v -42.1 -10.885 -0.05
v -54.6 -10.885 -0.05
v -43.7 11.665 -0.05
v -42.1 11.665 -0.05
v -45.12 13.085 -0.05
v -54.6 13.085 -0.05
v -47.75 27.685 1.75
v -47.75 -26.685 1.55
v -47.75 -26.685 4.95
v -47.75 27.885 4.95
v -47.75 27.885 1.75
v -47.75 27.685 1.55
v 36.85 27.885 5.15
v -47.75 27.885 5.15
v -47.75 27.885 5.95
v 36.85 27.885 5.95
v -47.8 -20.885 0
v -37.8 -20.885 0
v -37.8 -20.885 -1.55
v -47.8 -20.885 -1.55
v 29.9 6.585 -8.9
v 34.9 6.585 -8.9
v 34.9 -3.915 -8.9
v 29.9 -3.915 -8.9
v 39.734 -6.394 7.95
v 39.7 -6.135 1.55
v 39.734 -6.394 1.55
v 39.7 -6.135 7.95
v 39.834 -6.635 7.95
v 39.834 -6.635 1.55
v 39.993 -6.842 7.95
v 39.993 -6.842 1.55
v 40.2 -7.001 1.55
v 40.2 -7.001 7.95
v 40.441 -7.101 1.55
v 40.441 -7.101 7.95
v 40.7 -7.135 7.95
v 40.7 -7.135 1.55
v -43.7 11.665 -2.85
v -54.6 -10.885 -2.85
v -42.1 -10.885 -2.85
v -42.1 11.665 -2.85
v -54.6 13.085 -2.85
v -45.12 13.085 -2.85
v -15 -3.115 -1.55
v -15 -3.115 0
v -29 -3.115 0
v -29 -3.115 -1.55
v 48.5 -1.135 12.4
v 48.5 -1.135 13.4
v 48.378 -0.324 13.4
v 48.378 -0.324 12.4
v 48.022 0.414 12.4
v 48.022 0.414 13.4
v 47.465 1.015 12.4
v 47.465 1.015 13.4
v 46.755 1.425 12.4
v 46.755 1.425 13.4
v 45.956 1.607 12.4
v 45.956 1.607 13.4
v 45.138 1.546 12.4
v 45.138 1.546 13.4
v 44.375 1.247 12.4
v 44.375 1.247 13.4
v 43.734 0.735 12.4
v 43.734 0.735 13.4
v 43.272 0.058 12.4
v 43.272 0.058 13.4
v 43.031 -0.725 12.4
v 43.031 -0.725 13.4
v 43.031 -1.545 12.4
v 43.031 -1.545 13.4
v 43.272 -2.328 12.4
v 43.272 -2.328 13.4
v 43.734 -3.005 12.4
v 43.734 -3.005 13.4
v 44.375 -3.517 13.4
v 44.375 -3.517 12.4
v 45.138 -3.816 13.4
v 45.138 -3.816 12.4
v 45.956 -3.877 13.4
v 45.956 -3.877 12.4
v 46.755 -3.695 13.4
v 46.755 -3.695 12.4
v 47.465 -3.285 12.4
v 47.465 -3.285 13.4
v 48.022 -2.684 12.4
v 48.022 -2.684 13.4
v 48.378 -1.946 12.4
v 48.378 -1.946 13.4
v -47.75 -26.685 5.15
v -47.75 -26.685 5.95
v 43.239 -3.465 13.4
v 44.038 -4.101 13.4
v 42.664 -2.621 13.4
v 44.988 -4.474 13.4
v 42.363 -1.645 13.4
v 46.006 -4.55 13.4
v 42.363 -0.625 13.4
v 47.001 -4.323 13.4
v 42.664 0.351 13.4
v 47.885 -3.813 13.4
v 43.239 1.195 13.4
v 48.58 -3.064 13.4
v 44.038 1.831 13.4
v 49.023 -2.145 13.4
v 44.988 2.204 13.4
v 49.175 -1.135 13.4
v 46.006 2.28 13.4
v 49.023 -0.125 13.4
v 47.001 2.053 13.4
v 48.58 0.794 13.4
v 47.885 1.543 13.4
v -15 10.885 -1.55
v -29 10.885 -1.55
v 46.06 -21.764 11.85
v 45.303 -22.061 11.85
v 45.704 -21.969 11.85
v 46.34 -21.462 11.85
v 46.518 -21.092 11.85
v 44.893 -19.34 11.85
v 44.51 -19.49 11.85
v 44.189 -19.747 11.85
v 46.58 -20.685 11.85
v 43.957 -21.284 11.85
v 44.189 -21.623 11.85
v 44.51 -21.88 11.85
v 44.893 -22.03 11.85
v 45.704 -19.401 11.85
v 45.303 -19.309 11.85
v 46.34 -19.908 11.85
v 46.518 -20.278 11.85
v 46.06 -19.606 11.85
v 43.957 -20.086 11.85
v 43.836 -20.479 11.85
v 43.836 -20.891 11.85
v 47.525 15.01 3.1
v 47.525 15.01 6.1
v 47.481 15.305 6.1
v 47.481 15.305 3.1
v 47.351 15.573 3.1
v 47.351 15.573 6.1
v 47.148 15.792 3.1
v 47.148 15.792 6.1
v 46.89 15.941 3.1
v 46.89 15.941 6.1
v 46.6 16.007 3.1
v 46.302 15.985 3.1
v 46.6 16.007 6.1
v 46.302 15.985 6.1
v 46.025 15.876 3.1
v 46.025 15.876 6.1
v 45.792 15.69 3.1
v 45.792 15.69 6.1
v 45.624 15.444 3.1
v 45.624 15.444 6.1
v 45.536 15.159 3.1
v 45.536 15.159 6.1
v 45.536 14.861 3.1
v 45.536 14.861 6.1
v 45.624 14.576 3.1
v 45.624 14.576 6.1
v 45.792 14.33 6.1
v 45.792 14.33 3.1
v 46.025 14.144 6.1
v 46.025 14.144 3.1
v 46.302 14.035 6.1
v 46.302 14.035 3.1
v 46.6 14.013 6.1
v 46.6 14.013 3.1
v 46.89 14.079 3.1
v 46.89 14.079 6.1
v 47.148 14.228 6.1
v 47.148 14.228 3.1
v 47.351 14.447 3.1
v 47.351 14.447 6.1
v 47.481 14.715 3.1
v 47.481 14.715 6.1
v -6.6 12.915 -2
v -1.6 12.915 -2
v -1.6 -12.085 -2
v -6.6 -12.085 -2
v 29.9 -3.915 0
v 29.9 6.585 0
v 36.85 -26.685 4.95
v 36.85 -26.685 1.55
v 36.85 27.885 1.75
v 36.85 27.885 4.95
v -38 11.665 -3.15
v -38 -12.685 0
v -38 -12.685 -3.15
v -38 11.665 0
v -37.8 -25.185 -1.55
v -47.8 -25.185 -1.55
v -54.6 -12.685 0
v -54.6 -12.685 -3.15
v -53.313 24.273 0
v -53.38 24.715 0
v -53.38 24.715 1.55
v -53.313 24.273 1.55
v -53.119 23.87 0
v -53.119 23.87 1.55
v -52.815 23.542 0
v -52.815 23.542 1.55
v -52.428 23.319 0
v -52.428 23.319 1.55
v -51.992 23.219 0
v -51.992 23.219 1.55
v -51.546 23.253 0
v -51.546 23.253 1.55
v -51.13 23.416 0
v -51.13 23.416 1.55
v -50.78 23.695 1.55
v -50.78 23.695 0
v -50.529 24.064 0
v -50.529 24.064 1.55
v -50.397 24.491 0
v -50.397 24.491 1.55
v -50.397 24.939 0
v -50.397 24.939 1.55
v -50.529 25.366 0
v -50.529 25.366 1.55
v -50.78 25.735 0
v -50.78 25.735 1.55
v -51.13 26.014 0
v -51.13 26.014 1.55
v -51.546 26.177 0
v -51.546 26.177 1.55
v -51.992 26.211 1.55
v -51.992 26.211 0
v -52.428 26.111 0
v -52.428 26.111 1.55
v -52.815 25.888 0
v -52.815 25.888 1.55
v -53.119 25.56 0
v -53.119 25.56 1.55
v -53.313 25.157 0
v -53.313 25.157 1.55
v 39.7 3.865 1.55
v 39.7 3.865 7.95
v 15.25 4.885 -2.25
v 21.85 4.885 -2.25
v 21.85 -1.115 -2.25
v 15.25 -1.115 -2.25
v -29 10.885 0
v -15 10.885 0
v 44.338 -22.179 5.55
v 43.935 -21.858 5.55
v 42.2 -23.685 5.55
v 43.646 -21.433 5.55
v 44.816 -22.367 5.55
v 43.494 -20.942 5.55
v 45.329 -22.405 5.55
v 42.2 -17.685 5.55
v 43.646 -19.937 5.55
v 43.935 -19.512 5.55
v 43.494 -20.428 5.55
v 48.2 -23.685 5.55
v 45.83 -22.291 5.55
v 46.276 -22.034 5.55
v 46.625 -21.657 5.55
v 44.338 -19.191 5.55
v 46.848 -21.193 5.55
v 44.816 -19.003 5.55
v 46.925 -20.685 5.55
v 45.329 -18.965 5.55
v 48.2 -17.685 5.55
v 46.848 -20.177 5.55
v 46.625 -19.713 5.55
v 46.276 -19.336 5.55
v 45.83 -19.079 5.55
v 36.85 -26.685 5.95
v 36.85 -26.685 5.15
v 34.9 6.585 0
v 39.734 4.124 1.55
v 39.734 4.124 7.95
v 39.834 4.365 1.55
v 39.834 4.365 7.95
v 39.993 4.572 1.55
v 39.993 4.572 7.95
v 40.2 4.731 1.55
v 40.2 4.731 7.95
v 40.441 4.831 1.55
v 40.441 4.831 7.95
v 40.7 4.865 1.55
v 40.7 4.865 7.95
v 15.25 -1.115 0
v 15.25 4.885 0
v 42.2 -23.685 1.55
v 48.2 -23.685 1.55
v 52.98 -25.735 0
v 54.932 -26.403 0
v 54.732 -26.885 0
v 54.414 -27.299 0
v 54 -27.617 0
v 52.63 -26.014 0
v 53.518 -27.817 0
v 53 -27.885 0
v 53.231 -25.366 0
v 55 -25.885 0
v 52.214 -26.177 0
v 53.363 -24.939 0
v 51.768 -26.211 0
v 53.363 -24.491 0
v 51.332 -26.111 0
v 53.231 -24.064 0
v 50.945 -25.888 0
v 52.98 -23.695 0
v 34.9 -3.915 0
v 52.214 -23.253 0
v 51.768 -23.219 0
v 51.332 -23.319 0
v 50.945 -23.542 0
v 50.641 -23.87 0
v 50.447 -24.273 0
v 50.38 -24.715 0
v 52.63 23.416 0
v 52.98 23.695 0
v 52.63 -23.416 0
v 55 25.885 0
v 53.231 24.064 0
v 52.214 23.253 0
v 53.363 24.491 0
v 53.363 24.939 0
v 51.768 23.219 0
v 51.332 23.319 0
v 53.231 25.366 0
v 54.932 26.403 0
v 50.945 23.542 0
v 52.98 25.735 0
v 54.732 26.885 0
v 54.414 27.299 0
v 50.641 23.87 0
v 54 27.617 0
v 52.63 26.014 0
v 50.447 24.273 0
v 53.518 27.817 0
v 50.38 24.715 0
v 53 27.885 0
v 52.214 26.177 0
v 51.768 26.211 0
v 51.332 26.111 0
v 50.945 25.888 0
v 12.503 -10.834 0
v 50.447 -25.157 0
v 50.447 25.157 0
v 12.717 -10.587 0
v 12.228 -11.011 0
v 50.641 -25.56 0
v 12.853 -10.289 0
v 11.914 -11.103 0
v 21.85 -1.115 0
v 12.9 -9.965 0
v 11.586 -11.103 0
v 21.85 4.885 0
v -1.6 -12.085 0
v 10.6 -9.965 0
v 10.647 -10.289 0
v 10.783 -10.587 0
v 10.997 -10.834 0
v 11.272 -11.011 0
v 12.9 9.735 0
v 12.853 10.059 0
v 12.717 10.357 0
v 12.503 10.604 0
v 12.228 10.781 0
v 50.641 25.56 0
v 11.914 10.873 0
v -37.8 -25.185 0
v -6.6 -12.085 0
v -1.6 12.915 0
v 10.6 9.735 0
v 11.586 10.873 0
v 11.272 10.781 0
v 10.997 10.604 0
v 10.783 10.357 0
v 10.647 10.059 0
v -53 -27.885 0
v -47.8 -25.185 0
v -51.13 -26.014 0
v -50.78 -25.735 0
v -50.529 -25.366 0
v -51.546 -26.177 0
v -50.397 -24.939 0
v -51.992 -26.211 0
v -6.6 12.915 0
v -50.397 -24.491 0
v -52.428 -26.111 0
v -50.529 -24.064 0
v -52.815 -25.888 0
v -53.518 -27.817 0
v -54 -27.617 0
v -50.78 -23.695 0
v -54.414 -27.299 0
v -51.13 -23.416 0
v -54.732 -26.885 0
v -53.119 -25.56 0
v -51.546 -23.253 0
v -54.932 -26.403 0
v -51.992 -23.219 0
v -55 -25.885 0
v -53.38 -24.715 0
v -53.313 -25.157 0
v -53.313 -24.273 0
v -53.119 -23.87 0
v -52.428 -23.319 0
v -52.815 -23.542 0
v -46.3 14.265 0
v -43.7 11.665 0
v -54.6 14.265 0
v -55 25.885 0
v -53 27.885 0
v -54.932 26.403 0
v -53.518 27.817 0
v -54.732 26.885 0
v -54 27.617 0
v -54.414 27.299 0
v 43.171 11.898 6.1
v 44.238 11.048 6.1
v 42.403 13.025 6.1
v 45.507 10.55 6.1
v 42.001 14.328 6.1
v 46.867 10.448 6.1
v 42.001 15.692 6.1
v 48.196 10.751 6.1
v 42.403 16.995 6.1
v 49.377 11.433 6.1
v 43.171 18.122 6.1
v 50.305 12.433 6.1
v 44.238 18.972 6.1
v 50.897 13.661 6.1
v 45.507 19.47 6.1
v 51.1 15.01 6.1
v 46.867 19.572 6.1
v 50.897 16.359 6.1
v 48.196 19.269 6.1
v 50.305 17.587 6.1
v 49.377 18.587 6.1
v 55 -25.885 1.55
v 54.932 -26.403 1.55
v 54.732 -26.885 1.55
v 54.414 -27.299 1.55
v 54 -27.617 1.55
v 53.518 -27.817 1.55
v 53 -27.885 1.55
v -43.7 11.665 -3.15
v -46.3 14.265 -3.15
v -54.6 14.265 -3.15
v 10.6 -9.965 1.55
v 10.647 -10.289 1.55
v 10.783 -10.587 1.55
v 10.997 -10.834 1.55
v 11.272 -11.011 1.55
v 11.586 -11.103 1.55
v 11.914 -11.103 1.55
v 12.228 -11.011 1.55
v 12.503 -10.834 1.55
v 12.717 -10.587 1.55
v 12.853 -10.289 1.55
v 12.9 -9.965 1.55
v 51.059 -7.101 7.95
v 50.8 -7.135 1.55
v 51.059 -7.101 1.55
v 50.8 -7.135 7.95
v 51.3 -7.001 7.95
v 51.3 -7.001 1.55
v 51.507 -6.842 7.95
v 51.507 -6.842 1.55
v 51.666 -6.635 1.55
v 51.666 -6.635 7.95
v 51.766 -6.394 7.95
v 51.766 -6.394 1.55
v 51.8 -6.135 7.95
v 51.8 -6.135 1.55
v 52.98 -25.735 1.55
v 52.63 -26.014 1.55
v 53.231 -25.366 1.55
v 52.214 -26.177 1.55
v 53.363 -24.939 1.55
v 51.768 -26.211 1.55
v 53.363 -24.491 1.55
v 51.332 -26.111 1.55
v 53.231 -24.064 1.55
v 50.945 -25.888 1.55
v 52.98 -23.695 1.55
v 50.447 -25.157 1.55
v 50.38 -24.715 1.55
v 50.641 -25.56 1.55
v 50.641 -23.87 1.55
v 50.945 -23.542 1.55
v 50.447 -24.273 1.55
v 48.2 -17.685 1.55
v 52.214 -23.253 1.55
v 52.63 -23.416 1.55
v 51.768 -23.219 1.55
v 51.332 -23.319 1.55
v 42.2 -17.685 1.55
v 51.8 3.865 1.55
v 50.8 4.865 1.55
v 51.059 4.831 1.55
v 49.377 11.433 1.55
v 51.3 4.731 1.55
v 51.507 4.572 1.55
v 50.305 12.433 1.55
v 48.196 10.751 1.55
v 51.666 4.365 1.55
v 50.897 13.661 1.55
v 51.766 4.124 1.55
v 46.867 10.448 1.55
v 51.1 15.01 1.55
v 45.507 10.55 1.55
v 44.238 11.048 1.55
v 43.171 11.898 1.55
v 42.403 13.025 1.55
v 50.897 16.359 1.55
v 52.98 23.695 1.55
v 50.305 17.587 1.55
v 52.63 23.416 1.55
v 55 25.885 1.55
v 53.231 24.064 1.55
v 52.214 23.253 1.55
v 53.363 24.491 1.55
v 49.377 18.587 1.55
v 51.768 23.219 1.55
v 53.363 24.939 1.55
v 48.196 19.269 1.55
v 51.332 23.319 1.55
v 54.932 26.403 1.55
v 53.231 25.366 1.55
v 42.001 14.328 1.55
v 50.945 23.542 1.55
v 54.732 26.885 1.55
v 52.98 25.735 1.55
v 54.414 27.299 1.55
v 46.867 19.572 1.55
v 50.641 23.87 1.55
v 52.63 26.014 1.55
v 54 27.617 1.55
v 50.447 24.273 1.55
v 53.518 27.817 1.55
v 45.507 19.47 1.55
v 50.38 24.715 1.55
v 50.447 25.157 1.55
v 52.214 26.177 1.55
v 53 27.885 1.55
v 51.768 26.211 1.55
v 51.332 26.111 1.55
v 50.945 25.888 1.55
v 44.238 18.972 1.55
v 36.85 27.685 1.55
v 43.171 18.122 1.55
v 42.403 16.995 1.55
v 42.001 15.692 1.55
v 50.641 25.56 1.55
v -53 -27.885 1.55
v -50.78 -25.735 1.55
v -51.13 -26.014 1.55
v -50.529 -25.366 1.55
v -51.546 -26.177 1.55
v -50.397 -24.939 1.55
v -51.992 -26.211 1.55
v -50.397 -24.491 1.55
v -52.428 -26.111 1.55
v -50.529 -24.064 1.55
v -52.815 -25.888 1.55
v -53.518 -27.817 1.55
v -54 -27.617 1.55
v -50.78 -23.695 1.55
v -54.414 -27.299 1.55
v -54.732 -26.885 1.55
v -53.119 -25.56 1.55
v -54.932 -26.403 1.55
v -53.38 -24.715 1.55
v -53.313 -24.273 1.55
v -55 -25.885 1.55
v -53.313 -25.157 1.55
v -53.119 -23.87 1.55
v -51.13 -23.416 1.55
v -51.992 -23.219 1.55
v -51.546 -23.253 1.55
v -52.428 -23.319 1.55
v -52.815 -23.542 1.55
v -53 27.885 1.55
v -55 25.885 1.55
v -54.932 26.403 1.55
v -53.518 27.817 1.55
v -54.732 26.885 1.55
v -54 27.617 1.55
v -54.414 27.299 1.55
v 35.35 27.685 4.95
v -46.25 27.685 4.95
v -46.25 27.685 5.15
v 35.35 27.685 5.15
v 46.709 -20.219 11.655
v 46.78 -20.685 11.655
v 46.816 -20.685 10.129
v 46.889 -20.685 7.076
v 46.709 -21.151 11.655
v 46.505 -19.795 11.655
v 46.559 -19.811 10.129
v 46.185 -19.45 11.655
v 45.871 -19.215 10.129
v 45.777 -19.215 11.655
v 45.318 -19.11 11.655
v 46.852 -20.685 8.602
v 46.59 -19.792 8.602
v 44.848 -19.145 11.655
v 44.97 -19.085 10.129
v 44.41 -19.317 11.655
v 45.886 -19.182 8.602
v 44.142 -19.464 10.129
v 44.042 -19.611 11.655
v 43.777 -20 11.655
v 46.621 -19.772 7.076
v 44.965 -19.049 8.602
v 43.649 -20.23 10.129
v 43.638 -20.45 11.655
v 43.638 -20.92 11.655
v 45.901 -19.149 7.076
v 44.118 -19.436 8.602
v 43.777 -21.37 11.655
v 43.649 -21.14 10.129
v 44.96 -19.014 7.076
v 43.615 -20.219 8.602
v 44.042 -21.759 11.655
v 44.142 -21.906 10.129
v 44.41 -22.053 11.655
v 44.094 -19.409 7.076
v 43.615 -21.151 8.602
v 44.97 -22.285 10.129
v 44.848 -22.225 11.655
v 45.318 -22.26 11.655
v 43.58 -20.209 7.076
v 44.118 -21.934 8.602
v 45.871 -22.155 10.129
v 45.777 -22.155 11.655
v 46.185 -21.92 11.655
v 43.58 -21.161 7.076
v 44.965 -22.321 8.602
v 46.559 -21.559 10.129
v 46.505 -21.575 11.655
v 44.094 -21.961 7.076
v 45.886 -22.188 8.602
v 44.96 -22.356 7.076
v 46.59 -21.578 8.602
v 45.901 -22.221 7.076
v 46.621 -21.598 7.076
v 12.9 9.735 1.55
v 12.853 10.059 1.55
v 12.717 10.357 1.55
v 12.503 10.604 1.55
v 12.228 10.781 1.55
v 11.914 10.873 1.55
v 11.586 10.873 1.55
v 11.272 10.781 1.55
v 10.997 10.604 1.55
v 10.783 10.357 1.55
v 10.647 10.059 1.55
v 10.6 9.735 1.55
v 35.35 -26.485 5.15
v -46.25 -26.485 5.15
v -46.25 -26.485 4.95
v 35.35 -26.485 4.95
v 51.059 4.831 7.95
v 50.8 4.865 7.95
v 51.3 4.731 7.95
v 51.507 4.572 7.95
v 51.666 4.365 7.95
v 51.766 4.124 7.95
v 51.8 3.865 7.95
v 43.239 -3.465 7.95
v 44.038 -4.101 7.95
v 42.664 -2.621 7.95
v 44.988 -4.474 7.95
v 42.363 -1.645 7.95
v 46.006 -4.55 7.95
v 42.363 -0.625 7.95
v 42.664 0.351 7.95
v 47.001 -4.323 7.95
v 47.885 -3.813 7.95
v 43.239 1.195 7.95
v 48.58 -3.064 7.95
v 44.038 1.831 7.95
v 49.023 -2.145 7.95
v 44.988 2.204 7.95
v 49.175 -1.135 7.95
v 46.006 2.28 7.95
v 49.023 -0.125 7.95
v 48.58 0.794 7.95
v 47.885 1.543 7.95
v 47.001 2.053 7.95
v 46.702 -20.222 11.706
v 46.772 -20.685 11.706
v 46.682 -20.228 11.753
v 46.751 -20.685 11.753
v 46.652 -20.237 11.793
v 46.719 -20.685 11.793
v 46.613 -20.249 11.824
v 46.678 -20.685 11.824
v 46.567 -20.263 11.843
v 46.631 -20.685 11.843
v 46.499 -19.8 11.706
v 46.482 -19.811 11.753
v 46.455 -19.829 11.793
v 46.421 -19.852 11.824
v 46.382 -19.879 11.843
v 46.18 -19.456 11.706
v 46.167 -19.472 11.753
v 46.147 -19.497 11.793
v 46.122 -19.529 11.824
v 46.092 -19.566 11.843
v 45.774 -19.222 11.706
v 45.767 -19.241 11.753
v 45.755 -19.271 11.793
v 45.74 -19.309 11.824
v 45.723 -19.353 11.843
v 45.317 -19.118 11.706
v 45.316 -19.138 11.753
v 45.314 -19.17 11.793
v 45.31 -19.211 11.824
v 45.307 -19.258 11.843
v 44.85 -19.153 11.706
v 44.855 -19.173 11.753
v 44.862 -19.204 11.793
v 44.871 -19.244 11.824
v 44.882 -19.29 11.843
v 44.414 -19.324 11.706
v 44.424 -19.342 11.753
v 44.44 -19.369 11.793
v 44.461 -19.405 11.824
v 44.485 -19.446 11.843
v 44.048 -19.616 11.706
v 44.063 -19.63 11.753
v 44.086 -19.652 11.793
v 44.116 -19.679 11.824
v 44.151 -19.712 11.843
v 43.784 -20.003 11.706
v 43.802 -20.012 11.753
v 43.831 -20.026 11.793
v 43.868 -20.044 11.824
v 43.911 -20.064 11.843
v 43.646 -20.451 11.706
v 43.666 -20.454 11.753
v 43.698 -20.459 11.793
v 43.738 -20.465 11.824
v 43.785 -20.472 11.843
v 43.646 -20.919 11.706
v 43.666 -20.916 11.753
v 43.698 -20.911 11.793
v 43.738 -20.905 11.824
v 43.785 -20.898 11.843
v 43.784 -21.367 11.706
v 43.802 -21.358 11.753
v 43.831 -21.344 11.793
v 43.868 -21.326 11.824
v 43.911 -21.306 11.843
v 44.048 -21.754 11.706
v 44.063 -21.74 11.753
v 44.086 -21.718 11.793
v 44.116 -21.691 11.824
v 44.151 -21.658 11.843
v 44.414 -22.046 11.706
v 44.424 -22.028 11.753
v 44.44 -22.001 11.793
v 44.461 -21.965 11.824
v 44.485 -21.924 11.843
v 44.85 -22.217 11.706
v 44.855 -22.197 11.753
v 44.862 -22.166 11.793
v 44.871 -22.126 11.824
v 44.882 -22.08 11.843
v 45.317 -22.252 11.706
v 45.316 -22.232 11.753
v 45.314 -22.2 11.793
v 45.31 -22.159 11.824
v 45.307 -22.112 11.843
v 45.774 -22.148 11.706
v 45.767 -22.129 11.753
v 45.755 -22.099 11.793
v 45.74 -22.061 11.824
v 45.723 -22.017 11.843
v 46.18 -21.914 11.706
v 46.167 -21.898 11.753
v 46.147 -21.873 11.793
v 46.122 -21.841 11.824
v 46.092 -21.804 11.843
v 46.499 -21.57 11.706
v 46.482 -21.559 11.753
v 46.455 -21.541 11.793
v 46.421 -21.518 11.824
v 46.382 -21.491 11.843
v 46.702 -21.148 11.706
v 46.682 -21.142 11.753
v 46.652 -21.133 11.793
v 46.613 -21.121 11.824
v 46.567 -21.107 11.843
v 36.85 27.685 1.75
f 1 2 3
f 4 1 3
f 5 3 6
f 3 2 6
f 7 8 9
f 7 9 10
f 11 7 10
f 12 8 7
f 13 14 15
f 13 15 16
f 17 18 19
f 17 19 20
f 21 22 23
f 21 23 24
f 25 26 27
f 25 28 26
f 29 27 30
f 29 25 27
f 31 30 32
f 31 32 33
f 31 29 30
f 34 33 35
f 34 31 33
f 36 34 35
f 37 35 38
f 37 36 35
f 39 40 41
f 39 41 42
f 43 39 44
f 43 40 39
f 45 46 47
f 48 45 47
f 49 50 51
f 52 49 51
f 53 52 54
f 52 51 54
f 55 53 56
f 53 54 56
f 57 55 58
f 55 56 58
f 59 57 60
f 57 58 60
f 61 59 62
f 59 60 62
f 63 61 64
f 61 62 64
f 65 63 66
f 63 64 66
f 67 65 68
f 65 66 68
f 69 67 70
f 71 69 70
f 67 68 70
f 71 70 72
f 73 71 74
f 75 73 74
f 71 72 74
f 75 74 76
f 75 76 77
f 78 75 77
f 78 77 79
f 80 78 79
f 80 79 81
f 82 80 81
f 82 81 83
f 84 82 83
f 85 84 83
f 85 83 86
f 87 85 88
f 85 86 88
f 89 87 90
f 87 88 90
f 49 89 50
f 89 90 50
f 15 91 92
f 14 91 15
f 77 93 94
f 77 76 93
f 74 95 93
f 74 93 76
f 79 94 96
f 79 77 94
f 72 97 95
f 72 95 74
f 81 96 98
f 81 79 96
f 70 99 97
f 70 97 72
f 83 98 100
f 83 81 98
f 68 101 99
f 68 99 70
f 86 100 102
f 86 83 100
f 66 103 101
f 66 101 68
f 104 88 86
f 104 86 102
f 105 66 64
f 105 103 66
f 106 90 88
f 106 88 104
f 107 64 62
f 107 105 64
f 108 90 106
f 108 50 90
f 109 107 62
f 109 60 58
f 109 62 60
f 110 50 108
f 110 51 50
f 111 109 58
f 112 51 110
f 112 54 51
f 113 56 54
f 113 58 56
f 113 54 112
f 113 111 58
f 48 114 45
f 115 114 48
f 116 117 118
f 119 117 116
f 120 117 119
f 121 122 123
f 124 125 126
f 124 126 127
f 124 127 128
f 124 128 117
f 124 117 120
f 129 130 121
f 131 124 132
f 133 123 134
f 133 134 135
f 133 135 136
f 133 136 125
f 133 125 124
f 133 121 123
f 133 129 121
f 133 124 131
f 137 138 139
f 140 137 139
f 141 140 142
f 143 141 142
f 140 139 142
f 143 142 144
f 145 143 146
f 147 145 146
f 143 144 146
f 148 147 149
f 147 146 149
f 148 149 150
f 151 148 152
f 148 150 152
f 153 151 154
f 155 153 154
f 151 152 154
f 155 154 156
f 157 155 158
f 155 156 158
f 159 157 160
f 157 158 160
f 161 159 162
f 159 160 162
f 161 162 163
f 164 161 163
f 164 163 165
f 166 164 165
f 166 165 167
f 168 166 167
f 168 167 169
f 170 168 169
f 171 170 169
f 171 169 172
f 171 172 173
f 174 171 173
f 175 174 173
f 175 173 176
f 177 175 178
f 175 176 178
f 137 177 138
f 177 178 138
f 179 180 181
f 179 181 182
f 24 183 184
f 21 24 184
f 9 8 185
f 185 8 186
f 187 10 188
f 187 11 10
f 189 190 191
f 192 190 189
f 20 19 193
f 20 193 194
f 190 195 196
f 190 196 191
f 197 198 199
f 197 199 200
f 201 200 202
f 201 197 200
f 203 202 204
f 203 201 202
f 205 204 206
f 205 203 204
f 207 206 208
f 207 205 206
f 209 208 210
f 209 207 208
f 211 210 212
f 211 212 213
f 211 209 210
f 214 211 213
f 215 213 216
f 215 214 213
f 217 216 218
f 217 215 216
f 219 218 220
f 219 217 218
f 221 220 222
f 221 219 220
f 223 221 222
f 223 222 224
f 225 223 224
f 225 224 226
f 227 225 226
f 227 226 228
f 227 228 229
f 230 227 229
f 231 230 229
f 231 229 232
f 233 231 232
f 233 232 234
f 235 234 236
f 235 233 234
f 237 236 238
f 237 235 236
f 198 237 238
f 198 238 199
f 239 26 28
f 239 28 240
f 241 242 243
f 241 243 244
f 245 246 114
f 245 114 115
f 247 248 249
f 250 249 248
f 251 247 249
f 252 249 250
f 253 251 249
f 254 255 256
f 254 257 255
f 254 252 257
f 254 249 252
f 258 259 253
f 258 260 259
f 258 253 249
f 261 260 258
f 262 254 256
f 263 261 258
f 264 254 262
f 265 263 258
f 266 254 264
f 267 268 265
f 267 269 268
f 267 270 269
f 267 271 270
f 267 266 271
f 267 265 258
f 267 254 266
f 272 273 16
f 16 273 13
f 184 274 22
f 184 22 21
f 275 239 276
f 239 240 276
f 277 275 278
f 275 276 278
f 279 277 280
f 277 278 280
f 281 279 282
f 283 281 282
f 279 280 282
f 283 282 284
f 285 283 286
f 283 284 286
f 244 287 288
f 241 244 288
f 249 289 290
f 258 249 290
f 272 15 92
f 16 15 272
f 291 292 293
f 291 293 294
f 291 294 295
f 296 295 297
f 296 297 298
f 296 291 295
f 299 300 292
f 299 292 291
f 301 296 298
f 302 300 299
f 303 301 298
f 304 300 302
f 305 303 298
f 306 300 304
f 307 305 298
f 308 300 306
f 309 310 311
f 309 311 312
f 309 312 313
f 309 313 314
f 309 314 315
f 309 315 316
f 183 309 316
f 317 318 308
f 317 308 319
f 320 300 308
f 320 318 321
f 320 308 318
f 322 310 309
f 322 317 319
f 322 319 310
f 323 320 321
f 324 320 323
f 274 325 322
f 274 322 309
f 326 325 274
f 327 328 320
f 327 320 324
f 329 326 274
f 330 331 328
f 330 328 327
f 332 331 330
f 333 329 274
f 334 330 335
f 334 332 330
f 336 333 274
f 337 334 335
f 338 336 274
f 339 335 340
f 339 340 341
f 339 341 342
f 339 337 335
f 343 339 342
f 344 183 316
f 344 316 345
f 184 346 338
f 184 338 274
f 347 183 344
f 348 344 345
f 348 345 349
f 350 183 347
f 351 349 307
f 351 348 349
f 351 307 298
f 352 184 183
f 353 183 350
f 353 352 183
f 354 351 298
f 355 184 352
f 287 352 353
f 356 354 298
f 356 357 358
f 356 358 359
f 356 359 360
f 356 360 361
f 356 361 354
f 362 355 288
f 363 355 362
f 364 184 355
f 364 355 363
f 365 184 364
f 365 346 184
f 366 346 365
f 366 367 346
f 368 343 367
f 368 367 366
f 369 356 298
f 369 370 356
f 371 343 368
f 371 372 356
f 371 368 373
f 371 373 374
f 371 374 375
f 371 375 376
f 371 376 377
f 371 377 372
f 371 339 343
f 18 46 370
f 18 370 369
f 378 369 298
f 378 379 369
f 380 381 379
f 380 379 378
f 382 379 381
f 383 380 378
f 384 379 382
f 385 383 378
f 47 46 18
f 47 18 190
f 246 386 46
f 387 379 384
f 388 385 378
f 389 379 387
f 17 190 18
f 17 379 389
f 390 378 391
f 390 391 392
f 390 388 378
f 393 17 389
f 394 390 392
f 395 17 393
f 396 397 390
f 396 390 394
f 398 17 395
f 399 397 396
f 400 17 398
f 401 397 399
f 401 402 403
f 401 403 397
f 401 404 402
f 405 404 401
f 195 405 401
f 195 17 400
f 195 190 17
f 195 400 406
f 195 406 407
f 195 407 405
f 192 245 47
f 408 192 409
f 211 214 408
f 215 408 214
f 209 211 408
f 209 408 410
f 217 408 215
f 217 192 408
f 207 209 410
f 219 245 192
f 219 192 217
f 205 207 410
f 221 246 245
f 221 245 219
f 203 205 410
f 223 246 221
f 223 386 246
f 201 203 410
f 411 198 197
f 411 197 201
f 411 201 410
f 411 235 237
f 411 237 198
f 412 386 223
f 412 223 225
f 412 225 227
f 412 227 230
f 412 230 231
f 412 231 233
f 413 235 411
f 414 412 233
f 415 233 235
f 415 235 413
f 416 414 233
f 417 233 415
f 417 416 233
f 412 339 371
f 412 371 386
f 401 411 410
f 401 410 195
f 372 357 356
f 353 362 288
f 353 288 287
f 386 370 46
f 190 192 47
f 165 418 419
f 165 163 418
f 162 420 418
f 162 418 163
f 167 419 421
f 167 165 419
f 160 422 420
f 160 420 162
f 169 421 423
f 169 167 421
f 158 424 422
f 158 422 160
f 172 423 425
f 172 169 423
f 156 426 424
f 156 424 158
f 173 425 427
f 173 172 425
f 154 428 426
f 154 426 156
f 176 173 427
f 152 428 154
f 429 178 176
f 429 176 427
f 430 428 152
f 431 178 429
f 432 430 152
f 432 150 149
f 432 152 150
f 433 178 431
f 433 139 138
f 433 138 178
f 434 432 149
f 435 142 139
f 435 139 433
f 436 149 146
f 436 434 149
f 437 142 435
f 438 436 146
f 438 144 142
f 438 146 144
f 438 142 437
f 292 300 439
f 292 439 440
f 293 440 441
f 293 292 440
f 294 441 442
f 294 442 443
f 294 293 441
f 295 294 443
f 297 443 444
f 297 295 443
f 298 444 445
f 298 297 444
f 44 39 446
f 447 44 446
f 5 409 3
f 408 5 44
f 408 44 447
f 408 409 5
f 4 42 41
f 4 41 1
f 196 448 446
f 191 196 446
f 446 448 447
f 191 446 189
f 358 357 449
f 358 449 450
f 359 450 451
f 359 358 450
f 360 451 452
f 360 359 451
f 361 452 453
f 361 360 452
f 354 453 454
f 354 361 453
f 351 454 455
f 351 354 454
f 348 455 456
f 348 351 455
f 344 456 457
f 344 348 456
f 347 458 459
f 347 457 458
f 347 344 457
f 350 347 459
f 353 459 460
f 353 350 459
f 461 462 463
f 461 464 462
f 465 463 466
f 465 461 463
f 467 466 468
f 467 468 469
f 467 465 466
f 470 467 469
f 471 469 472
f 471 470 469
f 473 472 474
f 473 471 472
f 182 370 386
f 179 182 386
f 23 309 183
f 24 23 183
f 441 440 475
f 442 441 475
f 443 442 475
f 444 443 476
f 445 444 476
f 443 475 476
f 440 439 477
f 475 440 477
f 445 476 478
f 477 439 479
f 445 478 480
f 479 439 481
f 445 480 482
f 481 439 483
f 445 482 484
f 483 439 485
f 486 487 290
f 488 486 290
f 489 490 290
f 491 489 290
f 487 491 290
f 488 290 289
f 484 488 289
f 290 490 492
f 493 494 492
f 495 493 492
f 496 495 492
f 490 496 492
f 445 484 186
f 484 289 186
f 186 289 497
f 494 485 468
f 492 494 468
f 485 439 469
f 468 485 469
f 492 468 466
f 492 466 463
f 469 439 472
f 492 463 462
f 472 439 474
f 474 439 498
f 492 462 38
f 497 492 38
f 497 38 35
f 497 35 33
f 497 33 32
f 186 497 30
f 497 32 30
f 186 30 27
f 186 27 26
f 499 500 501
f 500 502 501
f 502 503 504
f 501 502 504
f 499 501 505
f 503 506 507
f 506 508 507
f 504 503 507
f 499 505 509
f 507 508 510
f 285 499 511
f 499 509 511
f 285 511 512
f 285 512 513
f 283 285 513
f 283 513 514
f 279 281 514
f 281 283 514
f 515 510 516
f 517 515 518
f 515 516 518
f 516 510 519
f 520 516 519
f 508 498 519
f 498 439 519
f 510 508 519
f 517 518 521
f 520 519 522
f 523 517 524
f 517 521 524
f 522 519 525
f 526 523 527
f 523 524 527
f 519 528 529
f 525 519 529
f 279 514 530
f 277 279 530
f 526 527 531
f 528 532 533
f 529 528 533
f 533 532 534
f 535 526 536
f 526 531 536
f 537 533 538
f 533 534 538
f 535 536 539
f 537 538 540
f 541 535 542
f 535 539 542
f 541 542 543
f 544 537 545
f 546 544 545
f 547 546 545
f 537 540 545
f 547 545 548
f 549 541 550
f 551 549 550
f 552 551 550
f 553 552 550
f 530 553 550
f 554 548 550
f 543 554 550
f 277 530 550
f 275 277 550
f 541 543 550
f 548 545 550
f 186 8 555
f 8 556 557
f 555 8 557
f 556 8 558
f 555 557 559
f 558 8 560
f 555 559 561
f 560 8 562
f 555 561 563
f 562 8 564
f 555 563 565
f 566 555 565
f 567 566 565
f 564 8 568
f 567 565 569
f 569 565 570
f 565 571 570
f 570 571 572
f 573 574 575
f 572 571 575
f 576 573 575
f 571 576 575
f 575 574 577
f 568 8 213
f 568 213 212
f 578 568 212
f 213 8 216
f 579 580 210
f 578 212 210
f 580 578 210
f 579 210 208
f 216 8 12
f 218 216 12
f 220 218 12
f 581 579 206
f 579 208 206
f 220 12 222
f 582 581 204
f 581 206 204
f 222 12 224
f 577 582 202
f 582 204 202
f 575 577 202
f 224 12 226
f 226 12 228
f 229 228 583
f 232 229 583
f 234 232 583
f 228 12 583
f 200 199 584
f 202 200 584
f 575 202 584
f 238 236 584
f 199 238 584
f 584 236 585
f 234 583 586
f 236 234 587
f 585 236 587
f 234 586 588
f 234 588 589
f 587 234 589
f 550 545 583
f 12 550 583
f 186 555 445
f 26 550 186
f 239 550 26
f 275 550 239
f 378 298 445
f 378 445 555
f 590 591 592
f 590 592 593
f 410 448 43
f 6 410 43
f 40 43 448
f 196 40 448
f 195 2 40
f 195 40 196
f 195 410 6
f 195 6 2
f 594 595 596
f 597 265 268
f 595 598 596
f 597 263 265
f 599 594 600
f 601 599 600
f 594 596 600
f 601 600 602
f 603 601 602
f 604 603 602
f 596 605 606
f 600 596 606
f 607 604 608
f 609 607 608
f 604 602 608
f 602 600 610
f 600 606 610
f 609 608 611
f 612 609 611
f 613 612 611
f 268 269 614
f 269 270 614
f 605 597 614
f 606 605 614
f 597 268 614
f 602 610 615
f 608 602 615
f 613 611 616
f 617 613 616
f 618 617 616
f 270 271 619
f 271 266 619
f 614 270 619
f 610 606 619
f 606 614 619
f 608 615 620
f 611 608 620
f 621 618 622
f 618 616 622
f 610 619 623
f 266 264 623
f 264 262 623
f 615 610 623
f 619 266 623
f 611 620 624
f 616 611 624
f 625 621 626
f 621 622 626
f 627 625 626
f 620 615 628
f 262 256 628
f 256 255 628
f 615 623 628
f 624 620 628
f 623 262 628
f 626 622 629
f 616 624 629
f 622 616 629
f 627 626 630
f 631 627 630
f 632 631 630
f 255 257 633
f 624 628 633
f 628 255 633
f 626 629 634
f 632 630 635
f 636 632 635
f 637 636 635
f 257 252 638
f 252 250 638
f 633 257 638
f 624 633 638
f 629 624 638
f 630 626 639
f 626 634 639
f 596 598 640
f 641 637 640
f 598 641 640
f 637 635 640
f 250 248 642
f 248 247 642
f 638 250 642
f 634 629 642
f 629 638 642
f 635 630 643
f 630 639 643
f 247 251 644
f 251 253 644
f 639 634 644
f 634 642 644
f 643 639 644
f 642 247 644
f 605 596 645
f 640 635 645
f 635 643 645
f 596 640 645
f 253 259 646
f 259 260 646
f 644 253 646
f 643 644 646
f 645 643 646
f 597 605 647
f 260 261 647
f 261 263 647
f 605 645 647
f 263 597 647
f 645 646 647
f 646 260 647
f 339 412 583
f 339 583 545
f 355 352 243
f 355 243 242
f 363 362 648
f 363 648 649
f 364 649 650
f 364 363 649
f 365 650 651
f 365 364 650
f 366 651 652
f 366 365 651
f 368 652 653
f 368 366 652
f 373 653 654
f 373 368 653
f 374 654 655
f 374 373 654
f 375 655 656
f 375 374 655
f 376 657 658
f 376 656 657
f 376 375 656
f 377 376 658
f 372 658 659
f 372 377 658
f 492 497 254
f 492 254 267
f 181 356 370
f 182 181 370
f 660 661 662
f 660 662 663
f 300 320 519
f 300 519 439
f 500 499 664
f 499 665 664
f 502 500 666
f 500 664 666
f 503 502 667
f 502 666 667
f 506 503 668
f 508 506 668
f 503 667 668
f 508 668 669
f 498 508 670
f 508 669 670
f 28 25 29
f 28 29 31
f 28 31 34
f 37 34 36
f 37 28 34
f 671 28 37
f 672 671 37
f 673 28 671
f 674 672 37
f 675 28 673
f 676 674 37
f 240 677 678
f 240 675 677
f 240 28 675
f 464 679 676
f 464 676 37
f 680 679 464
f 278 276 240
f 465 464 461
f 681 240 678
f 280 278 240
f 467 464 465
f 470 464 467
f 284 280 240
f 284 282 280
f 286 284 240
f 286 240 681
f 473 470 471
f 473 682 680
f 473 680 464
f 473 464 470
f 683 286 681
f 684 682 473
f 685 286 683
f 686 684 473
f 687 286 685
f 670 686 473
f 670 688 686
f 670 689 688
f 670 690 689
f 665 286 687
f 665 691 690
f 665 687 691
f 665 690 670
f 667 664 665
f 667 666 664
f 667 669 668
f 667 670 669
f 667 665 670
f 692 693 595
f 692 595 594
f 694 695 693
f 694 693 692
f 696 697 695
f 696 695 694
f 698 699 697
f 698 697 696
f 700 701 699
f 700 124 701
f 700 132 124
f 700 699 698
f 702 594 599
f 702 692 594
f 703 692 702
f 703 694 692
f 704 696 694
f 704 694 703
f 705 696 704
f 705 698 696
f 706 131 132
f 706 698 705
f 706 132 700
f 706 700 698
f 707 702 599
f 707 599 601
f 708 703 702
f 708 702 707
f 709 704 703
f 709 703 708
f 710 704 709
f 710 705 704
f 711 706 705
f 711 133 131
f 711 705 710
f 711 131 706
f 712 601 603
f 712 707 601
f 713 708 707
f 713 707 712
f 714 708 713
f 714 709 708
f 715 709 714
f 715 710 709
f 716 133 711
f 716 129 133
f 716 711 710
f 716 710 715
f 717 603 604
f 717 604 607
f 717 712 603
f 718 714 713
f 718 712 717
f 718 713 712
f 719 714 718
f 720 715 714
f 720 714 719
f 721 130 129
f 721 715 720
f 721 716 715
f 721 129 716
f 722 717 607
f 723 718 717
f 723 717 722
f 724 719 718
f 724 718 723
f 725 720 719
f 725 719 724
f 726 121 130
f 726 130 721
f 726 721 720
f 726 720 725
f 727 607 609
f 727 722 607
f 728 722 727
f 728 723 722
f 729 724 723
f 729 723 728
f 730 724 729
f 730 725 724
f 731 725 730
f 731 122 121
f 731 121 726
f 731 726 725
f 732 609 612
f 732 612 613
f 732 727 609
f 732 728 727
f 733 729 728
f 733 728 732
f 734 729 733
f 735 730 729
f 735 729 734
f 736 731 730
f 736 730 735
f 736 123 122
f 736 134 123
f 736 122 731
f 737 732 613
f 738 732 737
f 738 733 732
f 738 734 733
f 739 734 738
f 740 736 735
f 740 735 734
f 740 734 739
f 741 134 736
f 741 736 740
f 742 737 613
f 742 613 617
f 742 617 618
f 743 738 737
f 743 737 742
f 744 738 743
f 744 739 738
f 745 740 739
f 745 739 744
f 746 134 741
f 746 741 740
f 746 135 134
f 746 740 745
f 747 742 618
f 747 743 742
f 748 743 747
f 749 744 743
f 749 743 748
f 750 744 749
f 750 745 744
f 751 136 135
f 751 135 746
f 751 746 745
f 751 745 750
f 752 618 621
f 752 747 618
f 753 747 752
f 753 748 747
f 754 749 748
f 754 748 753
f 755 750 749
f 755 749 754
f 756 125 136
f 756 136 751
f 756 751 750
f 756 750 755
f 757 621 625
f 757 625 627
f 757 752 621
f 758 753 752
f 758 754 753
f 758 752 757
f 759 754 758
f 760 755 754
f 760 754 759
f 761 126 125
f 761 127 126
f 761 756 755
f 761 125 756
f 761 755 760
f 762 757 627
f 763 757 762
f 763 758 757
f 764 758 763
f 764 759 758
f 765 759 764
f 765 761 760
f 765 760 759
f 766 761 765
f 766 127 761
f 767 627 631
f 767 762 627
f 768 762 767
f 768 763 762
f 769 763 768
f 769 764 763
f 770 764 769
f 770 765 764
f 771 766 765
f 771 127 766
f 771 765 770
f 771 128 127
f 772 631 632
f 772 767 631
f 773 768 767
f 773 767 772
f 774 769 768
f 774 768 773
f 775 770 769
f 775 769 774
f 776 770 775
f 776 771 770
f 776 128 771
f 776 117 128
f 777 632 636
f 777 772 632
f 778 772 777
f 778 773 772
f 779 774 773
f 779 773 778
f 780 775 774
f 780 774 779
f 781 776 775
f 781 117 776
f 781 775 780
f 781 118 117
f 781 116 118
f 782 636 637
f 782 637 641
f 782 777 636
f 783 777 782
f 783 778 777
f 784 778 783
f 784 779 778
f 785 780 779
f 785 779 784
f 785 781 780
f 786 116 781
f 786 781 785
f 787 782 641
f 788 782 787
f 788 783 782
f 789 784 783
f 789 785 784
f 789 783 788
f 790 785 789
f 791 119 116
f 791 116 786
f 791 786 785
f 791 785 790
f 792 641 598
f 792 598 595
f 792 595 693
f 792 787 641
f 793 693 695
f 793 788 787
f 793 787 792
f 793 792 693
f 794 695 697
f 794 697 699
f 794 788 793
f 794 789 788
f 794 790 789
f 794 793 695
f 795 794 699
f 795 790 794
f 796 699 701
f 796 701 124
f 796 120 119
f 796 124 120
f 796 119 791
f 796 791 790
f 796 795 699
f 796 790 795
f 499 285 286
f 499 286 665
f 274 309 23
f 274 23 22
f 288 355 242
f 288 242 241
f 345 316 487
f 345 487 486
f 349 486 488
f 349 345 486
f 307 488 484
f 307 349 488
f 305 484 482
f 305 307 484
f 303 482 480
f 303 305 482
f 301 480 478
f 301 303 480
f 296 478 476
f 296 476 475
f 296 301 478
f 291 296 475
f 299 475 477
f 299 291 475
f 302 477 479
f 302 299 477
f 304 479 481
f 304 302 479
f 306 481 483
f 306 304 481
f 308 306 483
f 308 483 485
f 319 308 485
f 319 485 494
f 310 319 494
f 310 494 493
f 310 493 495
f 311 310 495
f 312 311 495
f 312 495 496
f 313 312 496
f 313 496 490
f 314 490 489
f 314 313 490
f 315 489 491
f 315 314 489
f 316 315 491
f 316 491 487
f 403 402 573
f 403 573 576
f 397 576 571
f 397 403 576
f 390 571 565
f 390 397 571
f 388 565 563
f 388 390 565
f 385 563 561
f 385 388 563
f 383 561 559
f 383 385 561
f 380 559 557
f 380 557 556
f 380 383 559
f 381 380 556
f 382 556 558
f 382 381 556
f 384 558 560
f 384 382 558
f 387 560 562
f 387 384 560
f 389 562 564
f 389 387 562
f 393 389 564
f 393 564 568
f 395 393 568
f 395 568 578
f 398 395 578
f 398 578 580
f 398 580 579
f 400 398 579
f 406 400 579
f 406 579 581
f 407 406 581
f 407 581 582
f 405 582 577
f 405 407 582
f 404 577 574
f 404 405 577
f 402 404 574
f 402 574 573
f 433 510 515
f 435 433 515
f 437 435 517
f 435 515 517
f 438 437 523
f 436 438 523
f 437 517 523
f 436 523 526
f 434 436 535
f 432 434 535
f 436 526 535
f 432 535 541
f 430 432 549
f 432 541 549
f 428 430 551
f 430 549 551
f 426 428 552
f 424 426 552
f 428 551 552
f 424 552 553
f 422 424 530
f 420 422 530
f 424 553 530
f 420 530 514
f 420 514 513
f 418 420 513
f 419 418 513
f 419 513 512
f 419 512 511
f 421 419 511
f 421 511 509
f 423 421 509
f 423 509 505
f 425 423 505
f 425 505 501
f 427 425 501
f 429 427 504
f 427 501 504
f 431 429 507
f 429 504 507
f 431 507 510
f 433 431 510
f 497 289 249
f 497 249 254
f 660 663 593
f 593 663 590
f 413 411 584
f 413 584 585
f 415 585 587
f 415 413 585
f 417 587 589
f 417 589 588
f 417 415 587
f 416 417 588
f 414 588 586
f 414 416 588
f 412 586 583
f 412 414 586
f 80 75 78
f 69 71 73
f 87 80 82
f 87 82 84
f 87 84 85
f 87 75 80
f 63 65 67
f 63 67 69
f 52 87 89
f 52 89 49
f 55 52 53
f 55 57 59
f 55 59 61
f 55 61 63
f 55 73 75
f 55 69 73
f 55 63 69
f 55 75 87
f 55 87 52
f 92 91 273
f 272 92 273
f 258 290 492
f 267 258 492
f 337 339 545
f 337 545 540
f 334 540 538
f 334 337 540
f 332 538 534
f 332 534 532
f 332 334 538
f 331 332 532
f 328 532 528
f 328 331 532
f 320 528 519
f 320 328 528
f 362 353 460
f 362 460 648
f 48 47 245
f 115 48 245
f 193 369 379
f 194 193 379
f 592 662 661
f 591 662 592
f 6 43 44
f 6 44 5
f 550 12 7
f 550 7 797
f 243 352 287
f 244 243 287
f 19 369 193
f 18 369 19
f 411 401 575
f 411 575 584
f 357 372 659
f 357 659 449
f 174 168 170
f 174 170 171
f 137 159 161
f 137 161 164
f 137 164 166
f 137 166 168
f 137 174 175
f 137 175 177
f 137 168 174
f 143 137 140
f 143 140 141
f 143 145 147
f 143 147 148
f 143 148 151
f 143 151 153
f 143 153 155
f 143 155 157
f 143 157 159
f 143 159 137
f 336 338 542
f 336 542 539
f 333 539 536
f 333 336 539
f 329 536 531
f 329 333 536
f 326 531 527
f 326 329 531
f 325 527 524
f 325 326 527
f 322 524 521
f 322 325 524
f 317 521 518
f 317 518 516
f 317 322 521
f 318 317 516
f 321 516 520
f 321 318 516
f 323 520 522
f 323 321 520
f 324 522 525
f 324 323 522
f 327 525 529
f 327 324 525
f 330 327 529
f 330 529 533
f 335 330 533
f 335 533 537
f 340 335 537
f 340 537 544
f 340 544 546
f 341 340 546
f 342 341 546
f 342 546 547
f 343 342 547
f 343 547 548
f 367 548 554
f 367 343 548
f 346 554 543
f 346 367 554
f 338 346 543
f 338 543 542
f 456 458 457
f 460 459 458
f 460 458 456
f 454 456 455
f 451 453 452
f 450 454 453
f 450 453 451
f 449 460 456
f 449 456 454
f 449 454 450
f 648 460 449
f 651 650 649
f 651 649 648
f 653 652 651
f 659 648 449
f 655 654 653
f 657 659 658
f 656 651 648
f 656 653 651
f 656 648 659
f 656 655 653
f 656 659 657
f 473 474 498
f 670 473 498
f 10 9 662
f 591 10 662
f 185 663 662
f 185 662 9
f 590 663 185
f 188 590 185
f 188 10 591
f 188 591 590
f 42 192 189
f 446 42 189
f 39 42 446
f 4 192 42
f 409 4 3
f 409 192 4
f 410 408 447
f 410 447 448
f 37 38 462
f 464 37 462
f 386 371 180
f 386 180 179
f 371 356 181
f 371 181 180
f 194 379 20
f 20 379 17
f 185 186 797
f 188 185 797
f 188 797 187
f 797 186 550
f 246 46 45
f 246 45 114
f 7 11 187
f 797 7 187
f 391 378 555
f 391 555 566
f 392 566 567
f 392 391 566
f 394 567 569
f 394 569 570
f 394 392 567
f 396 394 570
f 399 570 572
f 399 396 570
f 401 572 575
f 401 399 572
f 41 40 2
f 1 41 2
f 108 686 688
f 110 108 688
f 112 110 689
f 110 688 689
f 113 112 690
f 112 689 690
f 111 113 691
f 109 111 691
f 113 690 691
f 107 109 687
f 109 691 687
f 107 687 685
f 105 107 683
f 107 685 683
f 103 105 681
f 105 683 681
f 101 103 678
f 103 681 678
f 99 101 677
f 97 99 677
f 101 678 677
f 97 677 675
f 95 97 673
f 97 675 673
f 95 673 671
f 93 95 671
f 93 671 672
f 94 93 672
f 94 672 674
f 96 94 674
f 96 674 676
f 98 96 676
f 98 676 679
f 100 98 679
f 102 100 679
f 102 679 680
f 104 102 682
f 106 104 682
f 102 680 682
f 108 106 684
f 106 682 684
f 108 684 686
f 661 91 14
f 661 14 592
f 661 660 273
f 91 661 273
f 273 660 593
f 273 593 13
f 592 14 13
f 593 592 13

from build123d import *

# Parameters (mm, degrees)
SKETCH1_R            = 1.5
BOSS_EXTRUDE1_DEPTH  = 1.55
SKETCH3_W            = 14
SKETCH3_H            = 14
BOSS_EXTRUDE2_DEPTH  = 1.55
CUT_EXTRUDE1_REACH   = 63.684
BOSS_EXTRUDE3_DEPTH  = 3.15
SKETCH3_4_W          = 5
SKETCH3_4_H          = 25
BOSS_EXTRUDE4_DEPTH  = 2
SKETCH3_5_W          = 5
SKETCH3_5_H          = 10.5
BOSS_EXTRUDE5_DEPTH  = 8.9
SKETCH3_6_W          = 6.6
SKETCH3_6_H          = 6
BOSS_EXTRUDE6_DEPTH  = 2.25
SKETCH3_7_W          = 10
SKETCH3_7_H          = 4.3
BOSS_EXTRUDE7_DEPTH  = 1.55
SKETCH5_W            = 81.6
SKETCH5_H            = 54.57
BOSS_EXTRUDE8_DEPTH  = 3.6
SKETCH5_3_W          = 1.5
SKETCH5_3_H          = 54.57
BOSS_EXTRUDE9_DEPTH  = 3.4
SKETCH6_W            = 84.6
SKETCH6_H            = 54.57
BOSS_EXTRUDE10_DEPTH = 0.8
SKETCH5_4_W          = 6
SKETCH5_4_H          = 6
BOSS_EXTRUDE11_DEPTH = 4
SKETCH5_5_W          = 12.1
SKETCH5_5_H          = 12
BOSS_EXTRUDE12_DEPTH = 6.4
SKETCH5_6_R          = 4.575
BOSS_EXTRUDE13_DEPTH = 4.55
SKETCH7_R            = 1
CUT_EXTRUDE2_DEPTH   = 3
SKETCH8_R            = 3.425
BOSS_EXTRUDE14_DEPTH = 5.45
SKETCH10_R           = 1.575
SKETCH9_R            = 1.725
FILLET1_R            = 0.2
SKETCH11_W           = 2.8
SKETCH11_H           = 23.97
CUT_EXTRUDE3_DEPTH   = 12.5
FILLET2_R            = 1
SKETCH13_W           = 84.6
SKETCH13_H           = 0.2
SKETCH13_W_2         = 81.6
CUT_EXTRUDE4_DEPTH   = 0.2
SKETCH14_W           = 81.6
SKETCH14_H           = 0.2
CUT_EXTRUDE5_DEPTH   = 0.2
SKETCH15_R           = 2.75
CUT_EXTRUDE6_DEPTH   = 1


with BuildPart() as part:
    # Sketch1 → Boss-Extrude1 (new body)
    with BuildSketch(Plane.XY):
        with BuildLine():
            Line((-53, 27.885), (53, 27.885))
            ThreePointArc((53, 27.885), (54.414213562, 27.299213562), (55, 25.885))
            Line((55, 25.885), (55, -25.885))
            ThreePointArc((55, -25.885), (54.414213562, -27.299213562), (53, -27.885))
            Line((53, -27.885), (-53, -27.885))
            ThreePointArc((-53, -27.885), (-54.414213562, -27.299213562), (-55, -25.885))
            Line((-55, -25.885), (-55, 25.885))
            ThreePointArc((-55, 25.885), (-54.414213562, 27.299213562), (-53, 27.885))
        make_face()
        with Locations(Location((-51.88, 24.715, 0), (0, 0, 180))):
            Circle(SKETCH1_R, mode=Mode.SUBTRACT)
        with Locations(Location((51.88, 24.715, 0), (0, 0, 180))):
            Circle(SKETCH1_R, mode=Mode.SUBTRACT)
        with Locations(Location((51.88, -24.715, 0), (0, 0, 180))):
            Circle(SKETCH1_R, mode=Mode.SUBTRACT)
        with Locations(Location((-51.88, -24.715, 0), (0, 0, 180))):
            Circle(SKETCH1_R, mode=Mode.SUBTRACT)
    extrude(amount=BOSS_EXTRUDE1_DEPTH)

    # Sketch3 → Boss-Extrude2 (add)
    with BuildSketch(Plane(origin=(0, 0, 0), x_dir=(-1, 0, 0), z_dir=(0, 0, -1))):
        with Locations((22, 3.885)):
            Rectangle(SKETCH3_W, SKETCH3_H)
    extrude(amount=BOSS_EXTRUDE2_DEPTH)

    # Sketch4 → Cut-Extrude1 (cut, up to next)
    with BuildSketch(Plane(origin=(0, 0, 0), x_dir=(-1, 0, 0), z_dir=(0, 0, -1)), mode=Mode.PRIVATE) as cut_extrude1_sk1:
        with BuildLine():
            Line((-10.6, 9.735), (-10.6, -9.965))
            ThreePointArc((-10.6, -9.965), (-11.75, -11.115), (-12.9, -9.965))
            Line((-12.9, -9.965), (-12.9, 9.735))
            ThreePointArc((-12.9, 9.735), (-11.75, 10.885), (-10.6, 9.735))
        make_face()
    cut_extrude1_tool1 = extrude(cut_extrude1_sk1.sketch, amount=-CUT_EXTRUDE1_REACH, mode=Mode.PRIVATE) & part.part
    add(cut_extrude1_tool1.solids().sort_by_distance((11.75, -0.115, 0))[0], mode=Mode.SUBTRACT)

    # Sketch3<3> → Boss-Extrude3 (add)
    with BuildSketch(Plane(origin=(0, 0, 0), x_dir=(-1, 0, 0), z_dir=(0, 0, -1))):
        Polygon((43.7, 11.665), (46.3, 14.265), (54.6, 14.265), (54.6, -12.685), (38, -12.685), (38, 11.665), align=None)
    extrude(amount=BOSS_EXTRUDE3_DEPTH)

    # Sketch3<4> → Boss-Extrude4 (add)
    with BuildSketch(Plane(origin=(0, 0, 0), x_dir=(-1, 0, 0), z_dir=(0, 0, -1))):
        with Locations((4.1, 0.415)):
            Rectangle(SKETCH3_4_W, SKETCH3_4_H)
    extrude(amount=BOSS_EXTRUDE4_DEPTH)

    # Sketch3<5> → Boss-Extrude5 (add)
    with BuildSketch(Plane(origin=(0, 0, 0), x_dir=(-1, 0, 0), z_dir=(0, 0, -1))):
        with Locations((-32.4, 1.335)):
            Rectangle(SKETCH3_5_W, SKETCH3_5_H)
    extrude(amount=BOSS_EXTRUDE5_DEPTH)

    # Sketch3<6> → Boss-Extrude6 (add)
    with BuildSketch(Plane(origin=(0, 0, 0), x_dir=(-1, 0, 0), z_dir=(0, 0, -1))):
        with Locations((-18.55, 1.885)):
            Rectangle(SKETCH3_6_W, SKETCH3_6_H)
    extrude(amount=BOSS_EXTRUDE6_DEPTH)

    # Sketch3<7> → Boss-Extrude7 (add)
    with BuildSketch(Plane(origin=(0, 0, 0), x_dir=(-1, 0, 0), z_dir=(0, 0, -1))):
        with Locations((42.8, -23.035)):
            Rectangle(SKETCH3_7_W, SKETCH3_7_H)
    extrude(amount=BOSS_EXTRUDE7_DEPTH)

    # Sketch5 → Boss-Extrude8 (add)
    # profile 1 of 2: a face of its own
    with BuildSketch(Plane.XY.offset(1.55)):
        with Locations((-5.45, 0.6)):
            Rectangle(SKETCH5_W, SKETCH5_H)
        with BuildLine():
            Line((10.6, -9.965), (10.6, 9.735))
            ThreePointArc((10.6, 9.735), (11.75, 10.885), (12.9, 9.735))
            Line((12.9, 9.735), (12.9, -9.965))
            ThreePointArc((12.9, -9.965), (11.75, -11.115), (10.6, -9.965))
        make_face(mode=Mode.SUBTRACT)
    # profile 2 of 2: a face of its own
    with BuildSketch(Plane.XY.offset(1.55)):
        with BuildLine():
            ThreePointArc((10.6, 9.735), (11.75, 10.885), (12.9, 9.735))
            Line((12.9, 9.735), (12.9, -9.965))
            ThreePointArc((12.9, -9.965), (11.75, -11.115), (10.6, -9.965))
            Line((10.6, -9.965), (10.6, 9.735))
        make_face()
    extrude(amount=BOSS_EXTRUDE8_DEPTH)

    # Sketch5<3> → Boss-Extrude9 (add)
    with BuildSketch(Plane.XY.offset(1.55)):
        with Locations((-47, 0.6)):
            Rectangle(SKETCH5_3_W, SKETCH5_3_H)
        with Locations((36.1, 0.6)):
            Rectangle(SKETCH5_3_W, SKETCH5_3_H)
    extrude(amount=BOSS_EXTRUDE9_DEPTH)

    # Sketch6 → Boss-Extrude10 (add)
    with BuildSketch(Plane.XY.offset(5.15)):
        with Locations((-5.45, 0.6)):
            Rectangle(SKETCH6_W, SKETCH6_H)
    extrude(amount=BOSS_EXTRUDE10_DEPTH)

    # Sketch5<4> → Boss-Extrude11 (add)
    with BuildSketch(Plane.XY.offset(1.55)):
        with Locations((45.2, -20.685)):
            Rectangle(SKETCH5_4_W, SKETCH5_4_H)
    extrude(amount=BOSS_EXTRUDE11_DEPTH)

    # Sketch5<5> → Boss-Extrude12 (add)
    with BuildSketch(Plane.XY.offset(1.55)):
        with Locations((45.75, -1.135)):
            Rectangle(SKETCH5_5_W, SKETCH5_5_H)
    extrude(amount=BOSS_EXTRUDE12_DEPTH)

    # Sketch5<6> → Boss-Extrude13 (add)
    with BuildSketch(Plane.XY.offset(1.55)):
        with Locations((46.525, 15.01)):
            Circle(SKETCH5_6_R)
    extrude(amount=BOSS_EXTRUDE13_DEPTH)

    # Sketch7 → Cut-Extrude2 (cut)
    with BuildSketch(Plane.XY.offset(6.1)):
        with Locations((46.525, 15.01)):
            Circle(SKETCH7_R)
    extrude(amount=-CUT_EXTRUDE2_DEPTH, mode=Mode.SUBTRACT)

    # Sketch8 → Boss-Extrude14 (add)
    with BuildSketch(Plane.XY.offset(7.95)):
        with Locations((45.75, -1.135)):
            Circle(SKETCH8_R)
    extrude(amount=BOSS_EXTRUDE14_DEPTH)

    # Sketch10 → Loft1 section 0
    with BuildSketch(Plane.XY.offset(11.85)):
        with Locations((45.2, -20.685)):
            Circle(SKETCH10_R)
    # Sketch9 → Loft1 section 1
    with BuildSketch(Plane.XY.offset(5.55)):
        with Locations((45.2, -20.685)):
            Circle(SKETCH9_R)
    loft()

    # Fillet1
    fillet1_edges = [part.edges().sort_by_distance(p)[0] for p in [
        (43.625, -20.685, 11.85),
    ]]
    fillet(fillet1_edges, radius=FILLET1_R)

    # Sketch11 → Cut-Extrude3 (cut)
    with BuildSketch(Plane.ZY.offset(54.6)):
        with Locations((-1.45, 1.1)):
            Rectangle(SKETCH11_W, SKETCH11_H)
    extrude(amount=-CUT_EXTRUDE3_DEPTH, mode=Mode.SUBTRACT)

    # Fillet2
    fillet2_edges = [part.edges().sort_by_distance(p)[0] for p in [
        (51.8, -7.135, 4.75),
        (51.8, 4.865, 4.75),
        (39.7, 4.865, 4.75),
        (39.7, -7.135, 4.75),
    ]]
    fillet(fillet2_edges, radius=FILLET2_R)

    # Sketch13 → Cut-Extrude4 (cut)
    with BuildSketch(Plane(origin=(0, 27.885, 0), x_dir=(1, 0, 0), z_dir=(0, 1, 0))):
        with Locations((-5.45, -1.65)):
            Rectangle(SKETCH13_W, SKETCH13_H)
        with Locations((-5.45, -5.05)):
            Rectangle(SKETCH13_W_2, SKETCH13_H)
    extrude(amount=-CUT_EXTRUDE4_DEPTH, mode=Mode.SUBTRACT)

    # Sketch14 → Cut-Extrude5 (cut)
    with BuildSketch(Plane.XZ.offset(26.685)):
        with Locations((-5.45, 5.05)):
            Rectangle(SKETCH14_W, SKETCH14_H)
    extrude(amount=-CUT_EXTRUDE5_DEPTH, mode=Mode.SUBTRACT)

    # Sketch15 → Cut-Extrude6 (cut)
    with BuildSketch(Plane.XY.offset(13.4)):
        with Locations((45.75, -1.135)):
            Circle(SKETCH15_R)
    extrude(amount=-CUT_EXTRUDE6_DEPTH, mode=Mode.SUBTRACT)


solid = part.part
